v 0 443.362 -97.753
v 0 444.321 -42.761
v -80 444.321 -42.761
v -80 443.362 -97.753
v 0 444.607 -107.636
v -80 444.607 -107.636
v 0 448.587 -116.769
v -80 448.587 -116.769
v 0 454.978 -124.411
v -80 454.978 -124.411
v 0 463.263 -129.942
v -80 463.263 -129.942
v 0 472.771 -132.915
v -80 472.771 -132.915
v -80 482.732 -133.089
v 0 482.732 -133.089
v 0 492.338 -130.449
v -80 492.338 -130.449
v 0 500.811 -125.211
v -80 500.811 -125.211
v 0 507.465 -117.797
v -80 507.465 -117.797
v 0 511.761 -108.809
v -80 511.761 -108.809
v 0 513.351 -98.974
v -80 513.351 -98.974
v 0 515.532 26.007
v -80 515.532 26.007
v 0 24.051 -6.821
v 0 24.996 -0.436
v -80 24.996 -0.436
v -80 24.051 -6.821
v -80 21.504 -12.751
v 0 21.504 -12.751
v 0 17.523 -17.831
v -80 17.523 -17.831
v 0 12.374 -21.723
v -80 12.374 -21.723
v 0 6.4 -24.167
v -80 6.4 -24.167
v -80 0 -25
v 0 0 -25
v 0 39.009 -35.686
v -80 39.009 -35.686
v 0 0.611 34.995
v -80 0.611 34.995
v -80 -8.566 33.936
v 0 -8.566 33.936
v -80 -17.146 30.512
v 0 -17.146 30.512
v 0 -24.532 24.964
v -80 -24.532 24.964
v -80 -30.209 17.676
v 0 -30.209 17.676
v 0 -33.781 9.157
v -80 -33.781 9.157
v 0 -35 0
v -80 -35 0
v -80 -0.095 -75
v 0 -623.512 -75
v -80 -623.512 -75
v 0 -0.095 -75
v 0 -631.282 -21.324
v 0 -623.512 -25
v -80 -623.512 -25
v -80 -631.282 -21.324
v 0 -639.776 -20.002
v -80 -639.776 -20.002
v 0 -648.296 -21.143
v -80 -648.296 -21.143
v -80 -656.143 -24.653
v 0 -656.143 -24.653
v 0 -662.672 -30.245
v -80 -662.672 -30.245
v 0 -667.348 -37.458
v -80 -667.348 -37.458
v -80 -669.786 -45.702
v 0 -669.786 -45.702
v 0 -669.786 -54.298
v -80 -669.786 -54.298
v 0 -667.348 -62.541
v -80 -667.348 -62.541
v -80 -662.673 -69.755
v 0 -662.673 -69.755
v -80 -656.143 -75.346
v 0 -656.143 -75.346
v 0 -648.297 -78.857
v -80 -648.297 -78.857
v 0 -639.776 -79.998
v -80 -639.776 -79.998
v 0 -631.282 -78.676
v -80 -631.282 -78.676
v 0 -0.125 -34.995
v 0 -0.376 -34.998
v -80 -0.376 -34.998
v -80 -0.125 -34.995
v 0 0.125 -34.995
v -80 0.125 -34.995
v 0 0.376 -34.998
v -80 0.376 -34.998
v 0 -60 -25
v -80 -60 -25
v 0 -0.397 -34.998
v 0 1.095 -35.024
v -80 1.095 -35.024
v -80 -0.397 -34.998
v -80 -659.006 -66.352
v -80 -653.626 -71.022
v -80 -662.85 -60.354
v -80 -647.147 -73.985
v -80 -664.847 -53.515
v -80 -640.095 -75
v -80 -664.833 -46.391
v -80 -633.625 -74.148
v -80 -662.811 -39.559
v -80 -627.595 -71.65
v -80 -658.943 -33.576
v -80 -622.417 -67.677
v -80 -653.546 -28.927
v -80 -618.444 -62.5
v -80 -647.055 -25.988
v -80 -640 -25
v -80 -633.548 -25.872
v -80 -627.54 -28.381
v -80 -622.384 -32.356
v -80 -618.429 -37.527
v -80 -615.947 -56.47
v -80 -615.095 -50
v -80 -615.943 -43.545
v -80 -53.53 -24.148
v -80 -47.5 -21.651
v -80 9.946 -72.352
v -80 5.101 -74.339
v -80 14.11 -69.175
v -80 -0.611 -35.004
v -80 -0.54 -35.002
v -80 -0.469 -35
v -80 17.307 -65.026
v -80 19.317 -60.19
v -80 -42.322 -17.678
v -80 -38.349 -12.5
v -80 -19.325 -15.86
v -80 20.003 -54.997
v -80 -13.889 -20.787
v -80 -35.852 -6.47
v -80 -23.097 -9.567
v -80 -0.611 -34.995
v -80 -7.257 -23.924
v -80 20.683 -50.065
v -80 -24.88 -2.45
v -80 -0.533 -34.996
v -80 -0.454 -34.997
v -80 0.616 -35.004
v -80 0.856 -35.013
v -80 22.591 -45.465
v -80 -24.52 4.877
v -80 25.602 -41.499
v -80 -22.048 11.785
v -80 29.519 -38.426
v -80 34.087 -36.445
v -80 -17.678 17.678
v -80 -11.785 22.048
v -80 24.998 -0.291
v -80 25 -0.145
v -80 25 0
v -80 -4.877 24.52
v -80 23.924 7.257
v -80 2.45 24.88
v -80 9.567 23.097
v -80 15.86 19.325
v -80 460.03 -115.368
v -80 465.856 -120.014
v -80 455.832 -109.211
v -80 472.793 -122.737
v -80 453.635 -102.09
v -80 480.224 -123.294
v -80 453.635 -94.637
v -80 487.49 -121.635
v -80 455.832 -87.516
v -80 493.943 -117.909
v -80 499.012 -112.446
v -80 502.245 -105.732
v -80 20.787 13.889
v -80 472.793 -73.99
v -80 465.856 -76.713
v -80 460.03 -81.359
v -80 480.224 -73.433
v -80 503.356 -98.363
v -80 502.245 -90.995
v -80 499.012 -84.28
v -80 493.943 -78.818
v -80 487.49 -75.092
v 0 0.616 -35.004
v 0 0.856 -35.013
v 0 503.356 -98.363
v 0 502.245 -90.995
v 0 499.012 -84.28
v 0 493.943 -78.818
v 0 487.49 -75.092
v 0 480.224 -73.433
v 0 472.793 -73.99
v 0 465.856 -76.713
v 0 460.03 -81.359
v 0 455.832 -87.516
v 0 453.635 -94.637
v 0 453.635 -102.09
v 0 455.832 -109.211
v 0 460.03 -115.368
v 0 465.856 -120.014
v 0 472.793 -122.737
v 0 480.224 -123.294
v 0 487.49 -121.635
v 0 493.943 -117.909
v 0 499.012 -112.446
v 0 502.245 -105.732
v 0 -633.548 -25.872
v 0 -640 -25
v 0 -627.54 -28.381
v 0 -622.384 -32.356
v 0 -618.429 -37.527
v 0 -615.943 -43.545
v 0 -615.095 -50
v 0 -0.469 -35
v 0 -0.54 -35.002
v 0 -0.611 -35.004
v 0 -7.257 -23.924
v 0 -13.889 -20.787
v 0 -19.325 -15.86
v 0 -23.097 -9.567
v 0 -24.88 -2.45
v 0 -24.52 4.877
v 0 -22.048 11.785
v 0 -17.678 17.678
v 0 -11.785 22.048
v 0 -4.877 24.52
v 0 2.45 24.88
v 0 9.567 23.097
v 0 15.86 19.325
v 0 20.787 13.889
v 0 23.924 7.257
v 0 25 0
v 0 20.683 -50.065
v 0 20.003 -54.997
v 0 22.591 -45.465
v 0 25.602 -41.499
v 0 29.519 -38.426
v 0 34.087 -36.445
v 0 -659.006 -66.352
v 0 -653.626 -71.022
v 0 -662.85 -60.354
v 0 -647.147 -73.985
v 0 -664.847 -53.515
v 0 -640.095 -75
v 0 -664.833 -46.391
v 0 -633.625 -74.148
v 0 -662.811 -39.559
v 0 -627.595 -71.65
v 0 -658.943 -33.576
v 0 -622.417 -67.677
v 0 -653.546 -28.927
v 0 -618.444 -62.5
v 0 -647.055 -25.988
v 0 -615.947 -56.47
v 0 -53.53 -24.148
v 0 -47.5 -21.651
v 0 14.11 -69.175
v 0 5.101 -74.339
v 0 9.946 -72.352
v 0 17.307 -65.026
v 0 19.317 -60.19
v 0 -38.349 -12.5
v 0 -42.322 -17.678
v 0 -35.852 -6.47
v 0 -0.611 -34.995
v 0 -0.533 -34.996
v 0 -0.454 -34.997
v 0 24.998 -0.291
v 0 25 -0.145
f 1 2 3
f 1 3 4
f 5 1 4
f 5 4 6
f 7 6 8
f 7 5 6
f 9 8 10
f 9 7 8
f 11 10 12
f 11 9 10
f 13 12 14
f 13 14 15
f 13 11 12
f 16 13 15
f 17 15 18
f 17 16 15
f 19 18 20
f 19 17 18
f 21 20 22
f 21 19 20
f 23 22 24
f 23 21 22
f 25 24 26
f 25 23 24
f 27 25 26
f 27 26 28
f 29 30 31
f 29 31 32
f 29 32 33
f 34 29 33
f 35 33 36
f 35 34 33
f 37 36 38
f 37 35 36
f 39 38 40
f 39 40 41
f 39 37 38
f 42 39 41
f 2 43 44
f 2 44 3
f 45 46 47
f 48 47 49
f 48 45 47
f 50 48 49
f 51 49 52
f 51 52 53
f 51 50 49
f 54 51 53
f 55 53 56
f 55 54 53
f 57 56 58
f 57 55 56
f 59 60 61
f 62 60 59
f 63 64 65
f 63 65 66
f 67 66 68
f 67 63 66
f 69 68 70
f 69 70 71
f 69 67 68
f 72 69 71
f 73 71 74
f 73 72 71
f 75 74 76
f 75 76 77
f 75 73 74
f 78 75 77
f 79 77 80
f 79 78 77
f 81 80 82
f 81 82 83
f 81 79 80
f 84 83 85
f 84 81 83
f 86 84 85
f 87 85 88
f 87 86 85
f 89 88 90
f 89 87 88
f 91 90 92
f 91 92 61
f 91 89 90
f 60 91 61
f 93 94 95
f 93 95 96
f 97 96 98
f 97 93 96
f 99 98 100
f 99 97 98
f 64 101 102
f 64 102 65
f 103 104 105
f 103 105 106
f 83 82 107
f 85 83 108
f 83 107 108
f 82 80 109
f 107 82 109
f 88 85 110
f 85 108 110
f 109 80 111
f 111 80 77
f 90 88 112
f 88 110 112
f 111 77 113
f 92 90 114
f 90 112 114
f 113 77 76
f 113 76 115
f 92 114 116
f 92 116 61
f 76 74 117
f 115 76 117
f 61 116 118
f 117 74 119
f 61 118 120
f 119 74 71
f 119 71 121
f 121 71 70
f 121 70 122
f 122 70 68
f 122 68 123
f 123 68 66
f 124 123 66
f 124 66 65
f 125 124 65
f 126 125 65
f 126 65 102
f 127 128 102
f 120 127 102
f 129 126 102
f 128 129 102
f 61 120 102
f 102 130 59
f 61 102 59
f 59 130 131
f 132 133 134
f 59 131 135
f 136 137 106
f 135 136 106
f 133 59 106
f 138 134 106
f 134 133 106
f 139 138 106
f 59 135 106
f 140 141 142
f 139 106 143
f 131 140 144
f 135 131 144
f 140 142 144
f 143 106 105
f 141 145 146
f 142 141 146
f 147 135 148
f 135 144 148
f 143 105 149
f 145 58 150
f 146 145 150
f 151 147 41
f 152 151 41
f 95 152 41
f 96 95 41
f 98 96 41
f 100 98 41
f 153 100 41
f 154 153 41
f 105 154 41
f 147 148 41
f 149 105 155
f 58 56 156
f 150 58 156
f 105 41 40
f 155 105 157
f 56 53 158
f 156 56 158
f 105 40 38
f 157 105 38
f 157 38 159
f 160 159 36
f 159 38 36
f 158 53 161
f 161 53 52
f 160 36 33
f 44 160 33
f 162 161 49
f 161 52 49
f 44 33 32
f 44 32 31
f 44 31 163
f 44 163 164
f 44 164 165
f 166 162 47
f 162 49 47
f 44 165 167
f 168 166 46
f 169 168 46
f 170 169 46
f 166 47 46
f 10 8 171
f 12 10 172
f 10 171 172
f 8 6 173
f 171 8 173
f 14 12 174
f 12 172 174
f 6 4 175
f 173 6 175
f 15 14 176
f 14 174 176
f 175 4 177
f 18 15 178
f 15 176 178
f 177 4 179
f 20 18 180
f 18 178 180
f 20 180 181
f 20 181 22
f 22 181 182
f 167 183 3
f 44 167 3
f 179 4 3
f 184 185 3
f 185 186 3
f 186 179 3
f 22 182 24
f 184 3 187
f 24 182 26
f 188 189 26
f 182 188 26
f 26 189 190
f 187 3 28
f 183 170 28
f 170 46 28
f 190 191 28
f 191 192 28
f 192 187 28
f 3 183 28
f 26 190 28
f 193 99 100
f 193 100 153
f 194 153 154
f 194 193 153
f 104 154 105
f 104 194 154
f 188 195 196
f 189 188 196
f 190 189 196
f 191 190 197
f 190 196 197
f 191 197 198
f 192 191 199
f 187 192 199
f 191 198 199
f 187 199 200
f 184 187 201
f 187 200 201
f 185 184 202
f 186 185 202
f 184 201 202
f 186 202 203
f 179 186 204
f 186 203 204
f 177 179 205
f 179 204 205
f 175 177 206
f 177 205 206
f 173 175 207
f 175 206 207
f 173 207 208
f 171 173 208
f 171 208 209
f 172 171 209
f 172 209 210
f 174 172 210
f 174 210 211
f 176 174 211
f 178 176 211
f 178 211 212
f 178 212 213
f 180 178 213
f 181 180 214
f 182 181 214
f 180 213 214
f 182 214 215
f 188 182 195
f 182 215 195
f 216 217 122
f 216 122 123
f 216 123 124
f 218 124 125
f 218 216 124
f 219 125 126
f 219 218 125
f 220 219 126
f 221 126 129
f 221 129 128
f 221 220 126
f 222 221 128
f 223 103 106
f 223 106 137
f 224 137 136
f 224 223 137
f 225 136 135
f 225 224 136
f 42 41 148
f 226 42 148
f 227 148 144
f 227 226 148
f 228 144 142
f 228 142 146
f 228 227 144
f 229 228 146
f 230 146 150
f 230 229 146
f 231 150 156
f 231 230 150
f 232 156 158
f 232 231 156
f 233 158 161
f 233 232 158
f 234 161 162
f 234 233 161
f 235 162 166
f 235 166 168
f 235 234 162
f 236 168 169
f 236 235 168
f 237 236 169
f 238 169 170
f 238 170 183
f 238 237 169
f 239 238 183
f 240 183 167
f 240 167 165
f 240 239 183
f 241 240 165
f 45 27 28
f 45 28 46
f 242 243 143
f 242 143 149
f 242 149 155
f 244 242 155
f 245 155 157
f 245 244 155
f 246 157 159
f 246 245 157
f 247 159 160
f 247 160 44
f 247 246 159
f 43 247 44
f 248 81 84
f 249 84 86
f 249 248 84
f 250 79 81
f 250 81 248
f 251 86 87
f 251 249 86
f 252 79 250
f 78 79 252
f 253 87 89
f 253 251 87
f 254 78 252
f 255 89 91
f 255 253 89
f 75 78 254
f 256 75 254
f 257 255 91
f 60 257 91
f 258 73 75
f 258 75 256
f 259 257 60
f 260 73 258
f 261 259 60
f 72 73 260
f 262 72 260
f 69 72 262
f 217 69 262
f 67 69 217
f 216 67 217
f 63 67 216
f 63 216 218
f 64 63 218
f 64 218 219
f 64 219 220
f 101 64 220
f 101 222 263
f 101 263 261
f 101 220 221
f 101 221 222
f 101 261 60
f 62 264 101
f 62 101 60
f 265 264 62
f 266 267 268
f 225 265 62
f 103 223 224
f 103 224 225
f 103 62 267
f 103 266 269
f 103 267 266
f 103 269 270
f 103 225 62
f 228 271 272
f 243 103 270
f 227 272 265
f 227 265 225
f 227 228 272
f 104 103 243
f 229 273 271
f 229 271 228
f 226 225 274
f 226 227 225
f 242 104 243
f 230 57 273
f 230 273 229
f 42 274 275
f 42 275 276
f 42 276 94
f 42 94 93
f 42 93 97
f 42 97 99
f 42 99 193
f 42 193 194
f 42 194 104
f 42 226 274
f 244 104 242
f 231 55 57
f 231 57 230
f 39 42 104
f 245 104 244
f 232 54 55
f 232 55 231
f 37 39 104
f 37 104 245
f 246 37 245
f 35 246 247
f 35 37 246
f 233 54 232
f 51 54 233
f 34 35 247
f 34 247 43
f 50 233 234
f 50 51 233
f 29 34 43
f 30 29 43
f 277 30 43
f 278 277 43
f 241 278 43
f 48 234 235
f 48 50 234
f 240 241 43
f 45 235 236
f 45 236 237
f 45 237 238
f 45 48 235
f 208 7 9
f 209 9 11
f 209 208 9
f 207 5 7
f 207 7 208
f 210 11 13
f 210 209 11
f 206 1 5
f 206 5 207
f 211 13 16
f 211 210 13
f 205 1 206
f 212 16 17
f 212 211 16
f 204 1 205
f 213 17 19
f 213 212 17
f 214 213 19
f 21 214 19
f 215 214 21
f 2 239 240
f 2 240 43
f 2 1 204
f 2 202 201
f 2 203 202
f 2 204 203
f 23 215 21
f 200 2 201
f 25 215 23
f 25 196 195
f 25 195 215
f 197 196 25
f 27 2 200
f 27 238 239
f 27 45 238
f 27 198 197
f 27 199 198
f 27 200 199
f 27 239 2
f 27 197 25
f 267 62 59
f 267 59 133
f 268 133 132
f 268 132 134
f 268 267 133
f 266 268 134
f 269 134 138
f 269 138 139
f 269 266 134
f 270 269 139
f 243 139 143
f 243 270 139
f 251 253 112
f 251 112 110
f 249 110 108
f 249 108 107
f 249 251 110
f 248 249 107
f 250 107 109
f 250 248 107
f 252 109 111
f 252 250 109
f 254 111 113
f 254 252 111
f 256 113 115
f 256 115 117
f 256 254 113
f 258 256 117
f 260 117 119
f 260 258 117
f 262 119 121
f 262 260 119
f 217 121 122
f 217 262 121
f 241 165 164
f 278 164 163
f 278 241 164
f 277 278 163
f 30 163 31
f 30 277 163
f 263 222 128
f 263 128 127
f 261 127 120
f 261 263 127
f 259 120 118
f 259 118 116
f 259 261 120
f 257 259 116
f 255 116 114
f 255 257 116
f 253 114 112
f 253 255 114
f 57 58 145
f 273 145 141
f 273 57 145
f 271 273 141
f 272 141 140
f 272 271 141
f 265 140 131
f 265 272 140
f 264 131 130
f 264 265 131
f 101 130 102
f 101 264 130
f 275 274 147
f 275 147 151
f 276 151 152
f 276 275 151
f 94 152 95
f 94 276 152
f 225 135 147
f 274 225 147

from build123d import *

# Parameters (mm, degrees)
F0_R     = 25
F1_DEPTH = 80


with BuildPart() as f1:
    # F0 (on Right) → F1 (new body)
    with BuildSketch(Plane.YZ):
        with BuildLine():
            Line((514.9215630055, -8.9879893152), (34.9946693305, -0.6108342253))
            ThreePointArc((34.9946693305, -0.6108342253), (24.6655973277, -24.8315989914), (0.3760957557, -34.9979792557))
            ThreePointArc((0.3760957557, -34.9979792557), (0.7357689155, -35.0079798205), (1.0952040016, -35.0244483385))
            Line((1.0952040016, -35.0244483385), (39.008660322, -35.6862301802))
            Line((39.008660322, -35.6862301802), (444.3213901193, -42.7609901951))
            Line((444.3213901193, -42.7609901951), (443.3615077652, -97.7526134287))
            ThreePointArc((443.3615077652, -97.7526134287), (477.7453428704, -133.3581169844), (513.3508464262, -98.9742818793))
            Line((513.3508464262, -98.9742818793), (514.9215630055, -8.9879893152))
        make_face()
        with Locations((478.3561770957, -98.363447654)):
            Circle(F0_R, mode=Mode.SUBTRACT)
        with BuildLine():
            ThreePointArc((35, 0), (34.9986673072, -0.3054287424), (34.9946693305, -0.6108342253))
            Line((34.9946693305, -0.6108342253), (514.9215630055, -8.9879893152))
            Line((514.9215630055, -8.9879893152), (515.5323972308, 26.0066800153))
            Line((515.5323972308, 26.0066800153), (0.6108342253, 34.9946693305))
            ThreePointArc((0.6108342253, 34.9946693305), (24.9637657204, 24.5318242505), (35, 0))
        make_face()
        with BuildLine():
            ThreePointArc((24.9961923789, -0.4363101609), (17.5227316075, -17.8312612289), (0, -25))
            Line((0, -25), (-24.4948974278, -25))
            ThreePointArc((-24.4948974278, -25), (-13.5110249136, -32.2870284446), (-0.6108342253, -34.9946693305))
            ThreePointArc((-0.6108342253, -34.9946693305), (-0.4934677657, -34.9965211066), (-0.3760957557, -34.9979792557))
            ThreePointArc((-0.3760957557, -34.9979792557), (0, -34.9944432379), (0.3760957557, -34.9979792557))
            ThreePointArc((0.3760957557, -34.9979792557), (24.6655973277, -24.8315989914), (34.9946693305, -0.6108342253))
            Line((34.9946693305, -0.6108342253), (24.9961923789, -0.4363101609))
        make_face()
        with BuildLine():
            ThreePointArc((0, -25), (-17.6776695297, 17.6776695297), (25, 0))
            ThreePointArc((25, 0), (24.9990480766, -0.2181633875), (24.9961923789, -0.4363101609))
            Line((24.9961923789, -0.4363101609), (34.9946693305, -0.6108342253))
            ThreePointArc((34.9946693305, -0.6108342253), (34.9986673072, -0.3054287424), (35, 0))
            ThreePointArc((35, 0), (24.9637657204, 24.5318242505), (0.6108342253, 34.9946693305))
            ThreePointArc((0.6108342253, 34.9946693305), (-24.5318242505, 24.9637657204), (-35, 0))
            ThreePointArc((-35, 0), (-32.2670219417, -13.5587350078), (-24.4948974278, -25))
            Line((-24.4948974278, -25), (0, -25))
        make_face()
        with BuildLine():
            ThreePointArc((-0.6108342253, -34.9946693305), (-13.5110249136, -32.2870284446), (-24.4948974278, -25))
            Line((-24.4948974278, -25), (-60, -25))
            Line((-60, -25), (-623.5117081128, -25))
            ThreePointArc((-623.5117081128, -25), (-613.6612070325, -35.8135916236), (-610.0951047769, -49.999819101))
            ThreePointArc((-610.0951047769, -49.999819101), (-613.6612844084, -64.1861907556), (-623.5119808251, -74.999819101))
            Line((-623.5119808251, -74.999819101), (-0.0951047769, -74.999819101))
            Line((-0.0951047769, -74.999819101), (-0.6107169229, -35.0037684849))
            Line((-0.6107169229, -35.0037684849), (-0.6108342253, -34.9946693305))
        make_face()
        with BuildLine():
            Line((-60, -25), (-24.4948974278, -25))
            ThreePointArc((-24.4948974278, -25), (-32.2670219417, -13.5587350078), (-35, 0))
            ThreePointArc((-35, 0), (-42.3223304703, -17.6776695297), (-60, -25))
        make_face()
        with BuildLine():
            ThreePointArc((-610.0951047769, -49.999819101), (-613.6612070325, -35.8135916236), (-623.5117081128, -25))
            Line((-623.5117081128, -25), (-640, -25))
            ThreePointArc((-640, -25), (-622.3838425488, -32.3558062272), (-615.0951047769, -49.999819101))
            ThreePointArc((-615.0951047769, -49.999819101), (-622.4174352472, -67.6774886306), (-640.0951047769, -74.999819101))
            Line((-640.0951047769, -74.999819101), (-623.5119808251, -74.999819101))
            ThreePointArc((-623.5119808251, -74.999819101), (-613.6612844084, -64.1861907556), (-610.0951047769, -49.999819101))
        make_face()
        with BuildLine():
            Line((-640, -25), (-623.5117081128, -25))
            ThreePointArc((-623.5117081128, -25), (-670.0951047765, -49.999655473), (-623.5119808251, -74.999819101))
            Line((-623.5119808251, -74.999819101), (-640.0951047769, -74.999819101))
            ThreePointArc((-640.0951047769, -74.999819101), (-665.0950595521, -49.9522666265), (-640, -25))
        make_face()
        with BuildLine():
            Line((1.0952040016, -35.0244483385), (-0.3974963091, -34.9983931577))
            ThreePointArc((-0.3974963091, -34.9983931577), (-0.5041137806, -35.0007966248), (-0.6107169229, -35.0037684849))
            Line((-0.6107169229, -35.0037684849), (-0.0951047769, -74.999819101))
            ThreePointArc((-0.0951047769, -74.999819101), (14.1104515348, -69.1749451733), (20.0028009778, -54.9972442157))
            ThreePointArc((20.0028009778, -54.9972442157), (14.5261693958, -41.2457915782), (1.0952040016, -35.0244483385))
        make_face()
        with BuildLine():
            Line((39.008660322, -35.6862301802), (1.0952040016, -35.0244483385))
            ThreePointArc((1.0952040016, -35.0244483385), (14.5261693958, -41.2457915782), (20.0028009778, -54.9972442157))
            ThreePointArc((20.0028009778, -54.9972442157), (25.6016517806, -41.4993509969), (39.008660322, -35.6862301802))
        make_face()
    extrude(amount=-F1_DEPTH)


solid = f1.part
